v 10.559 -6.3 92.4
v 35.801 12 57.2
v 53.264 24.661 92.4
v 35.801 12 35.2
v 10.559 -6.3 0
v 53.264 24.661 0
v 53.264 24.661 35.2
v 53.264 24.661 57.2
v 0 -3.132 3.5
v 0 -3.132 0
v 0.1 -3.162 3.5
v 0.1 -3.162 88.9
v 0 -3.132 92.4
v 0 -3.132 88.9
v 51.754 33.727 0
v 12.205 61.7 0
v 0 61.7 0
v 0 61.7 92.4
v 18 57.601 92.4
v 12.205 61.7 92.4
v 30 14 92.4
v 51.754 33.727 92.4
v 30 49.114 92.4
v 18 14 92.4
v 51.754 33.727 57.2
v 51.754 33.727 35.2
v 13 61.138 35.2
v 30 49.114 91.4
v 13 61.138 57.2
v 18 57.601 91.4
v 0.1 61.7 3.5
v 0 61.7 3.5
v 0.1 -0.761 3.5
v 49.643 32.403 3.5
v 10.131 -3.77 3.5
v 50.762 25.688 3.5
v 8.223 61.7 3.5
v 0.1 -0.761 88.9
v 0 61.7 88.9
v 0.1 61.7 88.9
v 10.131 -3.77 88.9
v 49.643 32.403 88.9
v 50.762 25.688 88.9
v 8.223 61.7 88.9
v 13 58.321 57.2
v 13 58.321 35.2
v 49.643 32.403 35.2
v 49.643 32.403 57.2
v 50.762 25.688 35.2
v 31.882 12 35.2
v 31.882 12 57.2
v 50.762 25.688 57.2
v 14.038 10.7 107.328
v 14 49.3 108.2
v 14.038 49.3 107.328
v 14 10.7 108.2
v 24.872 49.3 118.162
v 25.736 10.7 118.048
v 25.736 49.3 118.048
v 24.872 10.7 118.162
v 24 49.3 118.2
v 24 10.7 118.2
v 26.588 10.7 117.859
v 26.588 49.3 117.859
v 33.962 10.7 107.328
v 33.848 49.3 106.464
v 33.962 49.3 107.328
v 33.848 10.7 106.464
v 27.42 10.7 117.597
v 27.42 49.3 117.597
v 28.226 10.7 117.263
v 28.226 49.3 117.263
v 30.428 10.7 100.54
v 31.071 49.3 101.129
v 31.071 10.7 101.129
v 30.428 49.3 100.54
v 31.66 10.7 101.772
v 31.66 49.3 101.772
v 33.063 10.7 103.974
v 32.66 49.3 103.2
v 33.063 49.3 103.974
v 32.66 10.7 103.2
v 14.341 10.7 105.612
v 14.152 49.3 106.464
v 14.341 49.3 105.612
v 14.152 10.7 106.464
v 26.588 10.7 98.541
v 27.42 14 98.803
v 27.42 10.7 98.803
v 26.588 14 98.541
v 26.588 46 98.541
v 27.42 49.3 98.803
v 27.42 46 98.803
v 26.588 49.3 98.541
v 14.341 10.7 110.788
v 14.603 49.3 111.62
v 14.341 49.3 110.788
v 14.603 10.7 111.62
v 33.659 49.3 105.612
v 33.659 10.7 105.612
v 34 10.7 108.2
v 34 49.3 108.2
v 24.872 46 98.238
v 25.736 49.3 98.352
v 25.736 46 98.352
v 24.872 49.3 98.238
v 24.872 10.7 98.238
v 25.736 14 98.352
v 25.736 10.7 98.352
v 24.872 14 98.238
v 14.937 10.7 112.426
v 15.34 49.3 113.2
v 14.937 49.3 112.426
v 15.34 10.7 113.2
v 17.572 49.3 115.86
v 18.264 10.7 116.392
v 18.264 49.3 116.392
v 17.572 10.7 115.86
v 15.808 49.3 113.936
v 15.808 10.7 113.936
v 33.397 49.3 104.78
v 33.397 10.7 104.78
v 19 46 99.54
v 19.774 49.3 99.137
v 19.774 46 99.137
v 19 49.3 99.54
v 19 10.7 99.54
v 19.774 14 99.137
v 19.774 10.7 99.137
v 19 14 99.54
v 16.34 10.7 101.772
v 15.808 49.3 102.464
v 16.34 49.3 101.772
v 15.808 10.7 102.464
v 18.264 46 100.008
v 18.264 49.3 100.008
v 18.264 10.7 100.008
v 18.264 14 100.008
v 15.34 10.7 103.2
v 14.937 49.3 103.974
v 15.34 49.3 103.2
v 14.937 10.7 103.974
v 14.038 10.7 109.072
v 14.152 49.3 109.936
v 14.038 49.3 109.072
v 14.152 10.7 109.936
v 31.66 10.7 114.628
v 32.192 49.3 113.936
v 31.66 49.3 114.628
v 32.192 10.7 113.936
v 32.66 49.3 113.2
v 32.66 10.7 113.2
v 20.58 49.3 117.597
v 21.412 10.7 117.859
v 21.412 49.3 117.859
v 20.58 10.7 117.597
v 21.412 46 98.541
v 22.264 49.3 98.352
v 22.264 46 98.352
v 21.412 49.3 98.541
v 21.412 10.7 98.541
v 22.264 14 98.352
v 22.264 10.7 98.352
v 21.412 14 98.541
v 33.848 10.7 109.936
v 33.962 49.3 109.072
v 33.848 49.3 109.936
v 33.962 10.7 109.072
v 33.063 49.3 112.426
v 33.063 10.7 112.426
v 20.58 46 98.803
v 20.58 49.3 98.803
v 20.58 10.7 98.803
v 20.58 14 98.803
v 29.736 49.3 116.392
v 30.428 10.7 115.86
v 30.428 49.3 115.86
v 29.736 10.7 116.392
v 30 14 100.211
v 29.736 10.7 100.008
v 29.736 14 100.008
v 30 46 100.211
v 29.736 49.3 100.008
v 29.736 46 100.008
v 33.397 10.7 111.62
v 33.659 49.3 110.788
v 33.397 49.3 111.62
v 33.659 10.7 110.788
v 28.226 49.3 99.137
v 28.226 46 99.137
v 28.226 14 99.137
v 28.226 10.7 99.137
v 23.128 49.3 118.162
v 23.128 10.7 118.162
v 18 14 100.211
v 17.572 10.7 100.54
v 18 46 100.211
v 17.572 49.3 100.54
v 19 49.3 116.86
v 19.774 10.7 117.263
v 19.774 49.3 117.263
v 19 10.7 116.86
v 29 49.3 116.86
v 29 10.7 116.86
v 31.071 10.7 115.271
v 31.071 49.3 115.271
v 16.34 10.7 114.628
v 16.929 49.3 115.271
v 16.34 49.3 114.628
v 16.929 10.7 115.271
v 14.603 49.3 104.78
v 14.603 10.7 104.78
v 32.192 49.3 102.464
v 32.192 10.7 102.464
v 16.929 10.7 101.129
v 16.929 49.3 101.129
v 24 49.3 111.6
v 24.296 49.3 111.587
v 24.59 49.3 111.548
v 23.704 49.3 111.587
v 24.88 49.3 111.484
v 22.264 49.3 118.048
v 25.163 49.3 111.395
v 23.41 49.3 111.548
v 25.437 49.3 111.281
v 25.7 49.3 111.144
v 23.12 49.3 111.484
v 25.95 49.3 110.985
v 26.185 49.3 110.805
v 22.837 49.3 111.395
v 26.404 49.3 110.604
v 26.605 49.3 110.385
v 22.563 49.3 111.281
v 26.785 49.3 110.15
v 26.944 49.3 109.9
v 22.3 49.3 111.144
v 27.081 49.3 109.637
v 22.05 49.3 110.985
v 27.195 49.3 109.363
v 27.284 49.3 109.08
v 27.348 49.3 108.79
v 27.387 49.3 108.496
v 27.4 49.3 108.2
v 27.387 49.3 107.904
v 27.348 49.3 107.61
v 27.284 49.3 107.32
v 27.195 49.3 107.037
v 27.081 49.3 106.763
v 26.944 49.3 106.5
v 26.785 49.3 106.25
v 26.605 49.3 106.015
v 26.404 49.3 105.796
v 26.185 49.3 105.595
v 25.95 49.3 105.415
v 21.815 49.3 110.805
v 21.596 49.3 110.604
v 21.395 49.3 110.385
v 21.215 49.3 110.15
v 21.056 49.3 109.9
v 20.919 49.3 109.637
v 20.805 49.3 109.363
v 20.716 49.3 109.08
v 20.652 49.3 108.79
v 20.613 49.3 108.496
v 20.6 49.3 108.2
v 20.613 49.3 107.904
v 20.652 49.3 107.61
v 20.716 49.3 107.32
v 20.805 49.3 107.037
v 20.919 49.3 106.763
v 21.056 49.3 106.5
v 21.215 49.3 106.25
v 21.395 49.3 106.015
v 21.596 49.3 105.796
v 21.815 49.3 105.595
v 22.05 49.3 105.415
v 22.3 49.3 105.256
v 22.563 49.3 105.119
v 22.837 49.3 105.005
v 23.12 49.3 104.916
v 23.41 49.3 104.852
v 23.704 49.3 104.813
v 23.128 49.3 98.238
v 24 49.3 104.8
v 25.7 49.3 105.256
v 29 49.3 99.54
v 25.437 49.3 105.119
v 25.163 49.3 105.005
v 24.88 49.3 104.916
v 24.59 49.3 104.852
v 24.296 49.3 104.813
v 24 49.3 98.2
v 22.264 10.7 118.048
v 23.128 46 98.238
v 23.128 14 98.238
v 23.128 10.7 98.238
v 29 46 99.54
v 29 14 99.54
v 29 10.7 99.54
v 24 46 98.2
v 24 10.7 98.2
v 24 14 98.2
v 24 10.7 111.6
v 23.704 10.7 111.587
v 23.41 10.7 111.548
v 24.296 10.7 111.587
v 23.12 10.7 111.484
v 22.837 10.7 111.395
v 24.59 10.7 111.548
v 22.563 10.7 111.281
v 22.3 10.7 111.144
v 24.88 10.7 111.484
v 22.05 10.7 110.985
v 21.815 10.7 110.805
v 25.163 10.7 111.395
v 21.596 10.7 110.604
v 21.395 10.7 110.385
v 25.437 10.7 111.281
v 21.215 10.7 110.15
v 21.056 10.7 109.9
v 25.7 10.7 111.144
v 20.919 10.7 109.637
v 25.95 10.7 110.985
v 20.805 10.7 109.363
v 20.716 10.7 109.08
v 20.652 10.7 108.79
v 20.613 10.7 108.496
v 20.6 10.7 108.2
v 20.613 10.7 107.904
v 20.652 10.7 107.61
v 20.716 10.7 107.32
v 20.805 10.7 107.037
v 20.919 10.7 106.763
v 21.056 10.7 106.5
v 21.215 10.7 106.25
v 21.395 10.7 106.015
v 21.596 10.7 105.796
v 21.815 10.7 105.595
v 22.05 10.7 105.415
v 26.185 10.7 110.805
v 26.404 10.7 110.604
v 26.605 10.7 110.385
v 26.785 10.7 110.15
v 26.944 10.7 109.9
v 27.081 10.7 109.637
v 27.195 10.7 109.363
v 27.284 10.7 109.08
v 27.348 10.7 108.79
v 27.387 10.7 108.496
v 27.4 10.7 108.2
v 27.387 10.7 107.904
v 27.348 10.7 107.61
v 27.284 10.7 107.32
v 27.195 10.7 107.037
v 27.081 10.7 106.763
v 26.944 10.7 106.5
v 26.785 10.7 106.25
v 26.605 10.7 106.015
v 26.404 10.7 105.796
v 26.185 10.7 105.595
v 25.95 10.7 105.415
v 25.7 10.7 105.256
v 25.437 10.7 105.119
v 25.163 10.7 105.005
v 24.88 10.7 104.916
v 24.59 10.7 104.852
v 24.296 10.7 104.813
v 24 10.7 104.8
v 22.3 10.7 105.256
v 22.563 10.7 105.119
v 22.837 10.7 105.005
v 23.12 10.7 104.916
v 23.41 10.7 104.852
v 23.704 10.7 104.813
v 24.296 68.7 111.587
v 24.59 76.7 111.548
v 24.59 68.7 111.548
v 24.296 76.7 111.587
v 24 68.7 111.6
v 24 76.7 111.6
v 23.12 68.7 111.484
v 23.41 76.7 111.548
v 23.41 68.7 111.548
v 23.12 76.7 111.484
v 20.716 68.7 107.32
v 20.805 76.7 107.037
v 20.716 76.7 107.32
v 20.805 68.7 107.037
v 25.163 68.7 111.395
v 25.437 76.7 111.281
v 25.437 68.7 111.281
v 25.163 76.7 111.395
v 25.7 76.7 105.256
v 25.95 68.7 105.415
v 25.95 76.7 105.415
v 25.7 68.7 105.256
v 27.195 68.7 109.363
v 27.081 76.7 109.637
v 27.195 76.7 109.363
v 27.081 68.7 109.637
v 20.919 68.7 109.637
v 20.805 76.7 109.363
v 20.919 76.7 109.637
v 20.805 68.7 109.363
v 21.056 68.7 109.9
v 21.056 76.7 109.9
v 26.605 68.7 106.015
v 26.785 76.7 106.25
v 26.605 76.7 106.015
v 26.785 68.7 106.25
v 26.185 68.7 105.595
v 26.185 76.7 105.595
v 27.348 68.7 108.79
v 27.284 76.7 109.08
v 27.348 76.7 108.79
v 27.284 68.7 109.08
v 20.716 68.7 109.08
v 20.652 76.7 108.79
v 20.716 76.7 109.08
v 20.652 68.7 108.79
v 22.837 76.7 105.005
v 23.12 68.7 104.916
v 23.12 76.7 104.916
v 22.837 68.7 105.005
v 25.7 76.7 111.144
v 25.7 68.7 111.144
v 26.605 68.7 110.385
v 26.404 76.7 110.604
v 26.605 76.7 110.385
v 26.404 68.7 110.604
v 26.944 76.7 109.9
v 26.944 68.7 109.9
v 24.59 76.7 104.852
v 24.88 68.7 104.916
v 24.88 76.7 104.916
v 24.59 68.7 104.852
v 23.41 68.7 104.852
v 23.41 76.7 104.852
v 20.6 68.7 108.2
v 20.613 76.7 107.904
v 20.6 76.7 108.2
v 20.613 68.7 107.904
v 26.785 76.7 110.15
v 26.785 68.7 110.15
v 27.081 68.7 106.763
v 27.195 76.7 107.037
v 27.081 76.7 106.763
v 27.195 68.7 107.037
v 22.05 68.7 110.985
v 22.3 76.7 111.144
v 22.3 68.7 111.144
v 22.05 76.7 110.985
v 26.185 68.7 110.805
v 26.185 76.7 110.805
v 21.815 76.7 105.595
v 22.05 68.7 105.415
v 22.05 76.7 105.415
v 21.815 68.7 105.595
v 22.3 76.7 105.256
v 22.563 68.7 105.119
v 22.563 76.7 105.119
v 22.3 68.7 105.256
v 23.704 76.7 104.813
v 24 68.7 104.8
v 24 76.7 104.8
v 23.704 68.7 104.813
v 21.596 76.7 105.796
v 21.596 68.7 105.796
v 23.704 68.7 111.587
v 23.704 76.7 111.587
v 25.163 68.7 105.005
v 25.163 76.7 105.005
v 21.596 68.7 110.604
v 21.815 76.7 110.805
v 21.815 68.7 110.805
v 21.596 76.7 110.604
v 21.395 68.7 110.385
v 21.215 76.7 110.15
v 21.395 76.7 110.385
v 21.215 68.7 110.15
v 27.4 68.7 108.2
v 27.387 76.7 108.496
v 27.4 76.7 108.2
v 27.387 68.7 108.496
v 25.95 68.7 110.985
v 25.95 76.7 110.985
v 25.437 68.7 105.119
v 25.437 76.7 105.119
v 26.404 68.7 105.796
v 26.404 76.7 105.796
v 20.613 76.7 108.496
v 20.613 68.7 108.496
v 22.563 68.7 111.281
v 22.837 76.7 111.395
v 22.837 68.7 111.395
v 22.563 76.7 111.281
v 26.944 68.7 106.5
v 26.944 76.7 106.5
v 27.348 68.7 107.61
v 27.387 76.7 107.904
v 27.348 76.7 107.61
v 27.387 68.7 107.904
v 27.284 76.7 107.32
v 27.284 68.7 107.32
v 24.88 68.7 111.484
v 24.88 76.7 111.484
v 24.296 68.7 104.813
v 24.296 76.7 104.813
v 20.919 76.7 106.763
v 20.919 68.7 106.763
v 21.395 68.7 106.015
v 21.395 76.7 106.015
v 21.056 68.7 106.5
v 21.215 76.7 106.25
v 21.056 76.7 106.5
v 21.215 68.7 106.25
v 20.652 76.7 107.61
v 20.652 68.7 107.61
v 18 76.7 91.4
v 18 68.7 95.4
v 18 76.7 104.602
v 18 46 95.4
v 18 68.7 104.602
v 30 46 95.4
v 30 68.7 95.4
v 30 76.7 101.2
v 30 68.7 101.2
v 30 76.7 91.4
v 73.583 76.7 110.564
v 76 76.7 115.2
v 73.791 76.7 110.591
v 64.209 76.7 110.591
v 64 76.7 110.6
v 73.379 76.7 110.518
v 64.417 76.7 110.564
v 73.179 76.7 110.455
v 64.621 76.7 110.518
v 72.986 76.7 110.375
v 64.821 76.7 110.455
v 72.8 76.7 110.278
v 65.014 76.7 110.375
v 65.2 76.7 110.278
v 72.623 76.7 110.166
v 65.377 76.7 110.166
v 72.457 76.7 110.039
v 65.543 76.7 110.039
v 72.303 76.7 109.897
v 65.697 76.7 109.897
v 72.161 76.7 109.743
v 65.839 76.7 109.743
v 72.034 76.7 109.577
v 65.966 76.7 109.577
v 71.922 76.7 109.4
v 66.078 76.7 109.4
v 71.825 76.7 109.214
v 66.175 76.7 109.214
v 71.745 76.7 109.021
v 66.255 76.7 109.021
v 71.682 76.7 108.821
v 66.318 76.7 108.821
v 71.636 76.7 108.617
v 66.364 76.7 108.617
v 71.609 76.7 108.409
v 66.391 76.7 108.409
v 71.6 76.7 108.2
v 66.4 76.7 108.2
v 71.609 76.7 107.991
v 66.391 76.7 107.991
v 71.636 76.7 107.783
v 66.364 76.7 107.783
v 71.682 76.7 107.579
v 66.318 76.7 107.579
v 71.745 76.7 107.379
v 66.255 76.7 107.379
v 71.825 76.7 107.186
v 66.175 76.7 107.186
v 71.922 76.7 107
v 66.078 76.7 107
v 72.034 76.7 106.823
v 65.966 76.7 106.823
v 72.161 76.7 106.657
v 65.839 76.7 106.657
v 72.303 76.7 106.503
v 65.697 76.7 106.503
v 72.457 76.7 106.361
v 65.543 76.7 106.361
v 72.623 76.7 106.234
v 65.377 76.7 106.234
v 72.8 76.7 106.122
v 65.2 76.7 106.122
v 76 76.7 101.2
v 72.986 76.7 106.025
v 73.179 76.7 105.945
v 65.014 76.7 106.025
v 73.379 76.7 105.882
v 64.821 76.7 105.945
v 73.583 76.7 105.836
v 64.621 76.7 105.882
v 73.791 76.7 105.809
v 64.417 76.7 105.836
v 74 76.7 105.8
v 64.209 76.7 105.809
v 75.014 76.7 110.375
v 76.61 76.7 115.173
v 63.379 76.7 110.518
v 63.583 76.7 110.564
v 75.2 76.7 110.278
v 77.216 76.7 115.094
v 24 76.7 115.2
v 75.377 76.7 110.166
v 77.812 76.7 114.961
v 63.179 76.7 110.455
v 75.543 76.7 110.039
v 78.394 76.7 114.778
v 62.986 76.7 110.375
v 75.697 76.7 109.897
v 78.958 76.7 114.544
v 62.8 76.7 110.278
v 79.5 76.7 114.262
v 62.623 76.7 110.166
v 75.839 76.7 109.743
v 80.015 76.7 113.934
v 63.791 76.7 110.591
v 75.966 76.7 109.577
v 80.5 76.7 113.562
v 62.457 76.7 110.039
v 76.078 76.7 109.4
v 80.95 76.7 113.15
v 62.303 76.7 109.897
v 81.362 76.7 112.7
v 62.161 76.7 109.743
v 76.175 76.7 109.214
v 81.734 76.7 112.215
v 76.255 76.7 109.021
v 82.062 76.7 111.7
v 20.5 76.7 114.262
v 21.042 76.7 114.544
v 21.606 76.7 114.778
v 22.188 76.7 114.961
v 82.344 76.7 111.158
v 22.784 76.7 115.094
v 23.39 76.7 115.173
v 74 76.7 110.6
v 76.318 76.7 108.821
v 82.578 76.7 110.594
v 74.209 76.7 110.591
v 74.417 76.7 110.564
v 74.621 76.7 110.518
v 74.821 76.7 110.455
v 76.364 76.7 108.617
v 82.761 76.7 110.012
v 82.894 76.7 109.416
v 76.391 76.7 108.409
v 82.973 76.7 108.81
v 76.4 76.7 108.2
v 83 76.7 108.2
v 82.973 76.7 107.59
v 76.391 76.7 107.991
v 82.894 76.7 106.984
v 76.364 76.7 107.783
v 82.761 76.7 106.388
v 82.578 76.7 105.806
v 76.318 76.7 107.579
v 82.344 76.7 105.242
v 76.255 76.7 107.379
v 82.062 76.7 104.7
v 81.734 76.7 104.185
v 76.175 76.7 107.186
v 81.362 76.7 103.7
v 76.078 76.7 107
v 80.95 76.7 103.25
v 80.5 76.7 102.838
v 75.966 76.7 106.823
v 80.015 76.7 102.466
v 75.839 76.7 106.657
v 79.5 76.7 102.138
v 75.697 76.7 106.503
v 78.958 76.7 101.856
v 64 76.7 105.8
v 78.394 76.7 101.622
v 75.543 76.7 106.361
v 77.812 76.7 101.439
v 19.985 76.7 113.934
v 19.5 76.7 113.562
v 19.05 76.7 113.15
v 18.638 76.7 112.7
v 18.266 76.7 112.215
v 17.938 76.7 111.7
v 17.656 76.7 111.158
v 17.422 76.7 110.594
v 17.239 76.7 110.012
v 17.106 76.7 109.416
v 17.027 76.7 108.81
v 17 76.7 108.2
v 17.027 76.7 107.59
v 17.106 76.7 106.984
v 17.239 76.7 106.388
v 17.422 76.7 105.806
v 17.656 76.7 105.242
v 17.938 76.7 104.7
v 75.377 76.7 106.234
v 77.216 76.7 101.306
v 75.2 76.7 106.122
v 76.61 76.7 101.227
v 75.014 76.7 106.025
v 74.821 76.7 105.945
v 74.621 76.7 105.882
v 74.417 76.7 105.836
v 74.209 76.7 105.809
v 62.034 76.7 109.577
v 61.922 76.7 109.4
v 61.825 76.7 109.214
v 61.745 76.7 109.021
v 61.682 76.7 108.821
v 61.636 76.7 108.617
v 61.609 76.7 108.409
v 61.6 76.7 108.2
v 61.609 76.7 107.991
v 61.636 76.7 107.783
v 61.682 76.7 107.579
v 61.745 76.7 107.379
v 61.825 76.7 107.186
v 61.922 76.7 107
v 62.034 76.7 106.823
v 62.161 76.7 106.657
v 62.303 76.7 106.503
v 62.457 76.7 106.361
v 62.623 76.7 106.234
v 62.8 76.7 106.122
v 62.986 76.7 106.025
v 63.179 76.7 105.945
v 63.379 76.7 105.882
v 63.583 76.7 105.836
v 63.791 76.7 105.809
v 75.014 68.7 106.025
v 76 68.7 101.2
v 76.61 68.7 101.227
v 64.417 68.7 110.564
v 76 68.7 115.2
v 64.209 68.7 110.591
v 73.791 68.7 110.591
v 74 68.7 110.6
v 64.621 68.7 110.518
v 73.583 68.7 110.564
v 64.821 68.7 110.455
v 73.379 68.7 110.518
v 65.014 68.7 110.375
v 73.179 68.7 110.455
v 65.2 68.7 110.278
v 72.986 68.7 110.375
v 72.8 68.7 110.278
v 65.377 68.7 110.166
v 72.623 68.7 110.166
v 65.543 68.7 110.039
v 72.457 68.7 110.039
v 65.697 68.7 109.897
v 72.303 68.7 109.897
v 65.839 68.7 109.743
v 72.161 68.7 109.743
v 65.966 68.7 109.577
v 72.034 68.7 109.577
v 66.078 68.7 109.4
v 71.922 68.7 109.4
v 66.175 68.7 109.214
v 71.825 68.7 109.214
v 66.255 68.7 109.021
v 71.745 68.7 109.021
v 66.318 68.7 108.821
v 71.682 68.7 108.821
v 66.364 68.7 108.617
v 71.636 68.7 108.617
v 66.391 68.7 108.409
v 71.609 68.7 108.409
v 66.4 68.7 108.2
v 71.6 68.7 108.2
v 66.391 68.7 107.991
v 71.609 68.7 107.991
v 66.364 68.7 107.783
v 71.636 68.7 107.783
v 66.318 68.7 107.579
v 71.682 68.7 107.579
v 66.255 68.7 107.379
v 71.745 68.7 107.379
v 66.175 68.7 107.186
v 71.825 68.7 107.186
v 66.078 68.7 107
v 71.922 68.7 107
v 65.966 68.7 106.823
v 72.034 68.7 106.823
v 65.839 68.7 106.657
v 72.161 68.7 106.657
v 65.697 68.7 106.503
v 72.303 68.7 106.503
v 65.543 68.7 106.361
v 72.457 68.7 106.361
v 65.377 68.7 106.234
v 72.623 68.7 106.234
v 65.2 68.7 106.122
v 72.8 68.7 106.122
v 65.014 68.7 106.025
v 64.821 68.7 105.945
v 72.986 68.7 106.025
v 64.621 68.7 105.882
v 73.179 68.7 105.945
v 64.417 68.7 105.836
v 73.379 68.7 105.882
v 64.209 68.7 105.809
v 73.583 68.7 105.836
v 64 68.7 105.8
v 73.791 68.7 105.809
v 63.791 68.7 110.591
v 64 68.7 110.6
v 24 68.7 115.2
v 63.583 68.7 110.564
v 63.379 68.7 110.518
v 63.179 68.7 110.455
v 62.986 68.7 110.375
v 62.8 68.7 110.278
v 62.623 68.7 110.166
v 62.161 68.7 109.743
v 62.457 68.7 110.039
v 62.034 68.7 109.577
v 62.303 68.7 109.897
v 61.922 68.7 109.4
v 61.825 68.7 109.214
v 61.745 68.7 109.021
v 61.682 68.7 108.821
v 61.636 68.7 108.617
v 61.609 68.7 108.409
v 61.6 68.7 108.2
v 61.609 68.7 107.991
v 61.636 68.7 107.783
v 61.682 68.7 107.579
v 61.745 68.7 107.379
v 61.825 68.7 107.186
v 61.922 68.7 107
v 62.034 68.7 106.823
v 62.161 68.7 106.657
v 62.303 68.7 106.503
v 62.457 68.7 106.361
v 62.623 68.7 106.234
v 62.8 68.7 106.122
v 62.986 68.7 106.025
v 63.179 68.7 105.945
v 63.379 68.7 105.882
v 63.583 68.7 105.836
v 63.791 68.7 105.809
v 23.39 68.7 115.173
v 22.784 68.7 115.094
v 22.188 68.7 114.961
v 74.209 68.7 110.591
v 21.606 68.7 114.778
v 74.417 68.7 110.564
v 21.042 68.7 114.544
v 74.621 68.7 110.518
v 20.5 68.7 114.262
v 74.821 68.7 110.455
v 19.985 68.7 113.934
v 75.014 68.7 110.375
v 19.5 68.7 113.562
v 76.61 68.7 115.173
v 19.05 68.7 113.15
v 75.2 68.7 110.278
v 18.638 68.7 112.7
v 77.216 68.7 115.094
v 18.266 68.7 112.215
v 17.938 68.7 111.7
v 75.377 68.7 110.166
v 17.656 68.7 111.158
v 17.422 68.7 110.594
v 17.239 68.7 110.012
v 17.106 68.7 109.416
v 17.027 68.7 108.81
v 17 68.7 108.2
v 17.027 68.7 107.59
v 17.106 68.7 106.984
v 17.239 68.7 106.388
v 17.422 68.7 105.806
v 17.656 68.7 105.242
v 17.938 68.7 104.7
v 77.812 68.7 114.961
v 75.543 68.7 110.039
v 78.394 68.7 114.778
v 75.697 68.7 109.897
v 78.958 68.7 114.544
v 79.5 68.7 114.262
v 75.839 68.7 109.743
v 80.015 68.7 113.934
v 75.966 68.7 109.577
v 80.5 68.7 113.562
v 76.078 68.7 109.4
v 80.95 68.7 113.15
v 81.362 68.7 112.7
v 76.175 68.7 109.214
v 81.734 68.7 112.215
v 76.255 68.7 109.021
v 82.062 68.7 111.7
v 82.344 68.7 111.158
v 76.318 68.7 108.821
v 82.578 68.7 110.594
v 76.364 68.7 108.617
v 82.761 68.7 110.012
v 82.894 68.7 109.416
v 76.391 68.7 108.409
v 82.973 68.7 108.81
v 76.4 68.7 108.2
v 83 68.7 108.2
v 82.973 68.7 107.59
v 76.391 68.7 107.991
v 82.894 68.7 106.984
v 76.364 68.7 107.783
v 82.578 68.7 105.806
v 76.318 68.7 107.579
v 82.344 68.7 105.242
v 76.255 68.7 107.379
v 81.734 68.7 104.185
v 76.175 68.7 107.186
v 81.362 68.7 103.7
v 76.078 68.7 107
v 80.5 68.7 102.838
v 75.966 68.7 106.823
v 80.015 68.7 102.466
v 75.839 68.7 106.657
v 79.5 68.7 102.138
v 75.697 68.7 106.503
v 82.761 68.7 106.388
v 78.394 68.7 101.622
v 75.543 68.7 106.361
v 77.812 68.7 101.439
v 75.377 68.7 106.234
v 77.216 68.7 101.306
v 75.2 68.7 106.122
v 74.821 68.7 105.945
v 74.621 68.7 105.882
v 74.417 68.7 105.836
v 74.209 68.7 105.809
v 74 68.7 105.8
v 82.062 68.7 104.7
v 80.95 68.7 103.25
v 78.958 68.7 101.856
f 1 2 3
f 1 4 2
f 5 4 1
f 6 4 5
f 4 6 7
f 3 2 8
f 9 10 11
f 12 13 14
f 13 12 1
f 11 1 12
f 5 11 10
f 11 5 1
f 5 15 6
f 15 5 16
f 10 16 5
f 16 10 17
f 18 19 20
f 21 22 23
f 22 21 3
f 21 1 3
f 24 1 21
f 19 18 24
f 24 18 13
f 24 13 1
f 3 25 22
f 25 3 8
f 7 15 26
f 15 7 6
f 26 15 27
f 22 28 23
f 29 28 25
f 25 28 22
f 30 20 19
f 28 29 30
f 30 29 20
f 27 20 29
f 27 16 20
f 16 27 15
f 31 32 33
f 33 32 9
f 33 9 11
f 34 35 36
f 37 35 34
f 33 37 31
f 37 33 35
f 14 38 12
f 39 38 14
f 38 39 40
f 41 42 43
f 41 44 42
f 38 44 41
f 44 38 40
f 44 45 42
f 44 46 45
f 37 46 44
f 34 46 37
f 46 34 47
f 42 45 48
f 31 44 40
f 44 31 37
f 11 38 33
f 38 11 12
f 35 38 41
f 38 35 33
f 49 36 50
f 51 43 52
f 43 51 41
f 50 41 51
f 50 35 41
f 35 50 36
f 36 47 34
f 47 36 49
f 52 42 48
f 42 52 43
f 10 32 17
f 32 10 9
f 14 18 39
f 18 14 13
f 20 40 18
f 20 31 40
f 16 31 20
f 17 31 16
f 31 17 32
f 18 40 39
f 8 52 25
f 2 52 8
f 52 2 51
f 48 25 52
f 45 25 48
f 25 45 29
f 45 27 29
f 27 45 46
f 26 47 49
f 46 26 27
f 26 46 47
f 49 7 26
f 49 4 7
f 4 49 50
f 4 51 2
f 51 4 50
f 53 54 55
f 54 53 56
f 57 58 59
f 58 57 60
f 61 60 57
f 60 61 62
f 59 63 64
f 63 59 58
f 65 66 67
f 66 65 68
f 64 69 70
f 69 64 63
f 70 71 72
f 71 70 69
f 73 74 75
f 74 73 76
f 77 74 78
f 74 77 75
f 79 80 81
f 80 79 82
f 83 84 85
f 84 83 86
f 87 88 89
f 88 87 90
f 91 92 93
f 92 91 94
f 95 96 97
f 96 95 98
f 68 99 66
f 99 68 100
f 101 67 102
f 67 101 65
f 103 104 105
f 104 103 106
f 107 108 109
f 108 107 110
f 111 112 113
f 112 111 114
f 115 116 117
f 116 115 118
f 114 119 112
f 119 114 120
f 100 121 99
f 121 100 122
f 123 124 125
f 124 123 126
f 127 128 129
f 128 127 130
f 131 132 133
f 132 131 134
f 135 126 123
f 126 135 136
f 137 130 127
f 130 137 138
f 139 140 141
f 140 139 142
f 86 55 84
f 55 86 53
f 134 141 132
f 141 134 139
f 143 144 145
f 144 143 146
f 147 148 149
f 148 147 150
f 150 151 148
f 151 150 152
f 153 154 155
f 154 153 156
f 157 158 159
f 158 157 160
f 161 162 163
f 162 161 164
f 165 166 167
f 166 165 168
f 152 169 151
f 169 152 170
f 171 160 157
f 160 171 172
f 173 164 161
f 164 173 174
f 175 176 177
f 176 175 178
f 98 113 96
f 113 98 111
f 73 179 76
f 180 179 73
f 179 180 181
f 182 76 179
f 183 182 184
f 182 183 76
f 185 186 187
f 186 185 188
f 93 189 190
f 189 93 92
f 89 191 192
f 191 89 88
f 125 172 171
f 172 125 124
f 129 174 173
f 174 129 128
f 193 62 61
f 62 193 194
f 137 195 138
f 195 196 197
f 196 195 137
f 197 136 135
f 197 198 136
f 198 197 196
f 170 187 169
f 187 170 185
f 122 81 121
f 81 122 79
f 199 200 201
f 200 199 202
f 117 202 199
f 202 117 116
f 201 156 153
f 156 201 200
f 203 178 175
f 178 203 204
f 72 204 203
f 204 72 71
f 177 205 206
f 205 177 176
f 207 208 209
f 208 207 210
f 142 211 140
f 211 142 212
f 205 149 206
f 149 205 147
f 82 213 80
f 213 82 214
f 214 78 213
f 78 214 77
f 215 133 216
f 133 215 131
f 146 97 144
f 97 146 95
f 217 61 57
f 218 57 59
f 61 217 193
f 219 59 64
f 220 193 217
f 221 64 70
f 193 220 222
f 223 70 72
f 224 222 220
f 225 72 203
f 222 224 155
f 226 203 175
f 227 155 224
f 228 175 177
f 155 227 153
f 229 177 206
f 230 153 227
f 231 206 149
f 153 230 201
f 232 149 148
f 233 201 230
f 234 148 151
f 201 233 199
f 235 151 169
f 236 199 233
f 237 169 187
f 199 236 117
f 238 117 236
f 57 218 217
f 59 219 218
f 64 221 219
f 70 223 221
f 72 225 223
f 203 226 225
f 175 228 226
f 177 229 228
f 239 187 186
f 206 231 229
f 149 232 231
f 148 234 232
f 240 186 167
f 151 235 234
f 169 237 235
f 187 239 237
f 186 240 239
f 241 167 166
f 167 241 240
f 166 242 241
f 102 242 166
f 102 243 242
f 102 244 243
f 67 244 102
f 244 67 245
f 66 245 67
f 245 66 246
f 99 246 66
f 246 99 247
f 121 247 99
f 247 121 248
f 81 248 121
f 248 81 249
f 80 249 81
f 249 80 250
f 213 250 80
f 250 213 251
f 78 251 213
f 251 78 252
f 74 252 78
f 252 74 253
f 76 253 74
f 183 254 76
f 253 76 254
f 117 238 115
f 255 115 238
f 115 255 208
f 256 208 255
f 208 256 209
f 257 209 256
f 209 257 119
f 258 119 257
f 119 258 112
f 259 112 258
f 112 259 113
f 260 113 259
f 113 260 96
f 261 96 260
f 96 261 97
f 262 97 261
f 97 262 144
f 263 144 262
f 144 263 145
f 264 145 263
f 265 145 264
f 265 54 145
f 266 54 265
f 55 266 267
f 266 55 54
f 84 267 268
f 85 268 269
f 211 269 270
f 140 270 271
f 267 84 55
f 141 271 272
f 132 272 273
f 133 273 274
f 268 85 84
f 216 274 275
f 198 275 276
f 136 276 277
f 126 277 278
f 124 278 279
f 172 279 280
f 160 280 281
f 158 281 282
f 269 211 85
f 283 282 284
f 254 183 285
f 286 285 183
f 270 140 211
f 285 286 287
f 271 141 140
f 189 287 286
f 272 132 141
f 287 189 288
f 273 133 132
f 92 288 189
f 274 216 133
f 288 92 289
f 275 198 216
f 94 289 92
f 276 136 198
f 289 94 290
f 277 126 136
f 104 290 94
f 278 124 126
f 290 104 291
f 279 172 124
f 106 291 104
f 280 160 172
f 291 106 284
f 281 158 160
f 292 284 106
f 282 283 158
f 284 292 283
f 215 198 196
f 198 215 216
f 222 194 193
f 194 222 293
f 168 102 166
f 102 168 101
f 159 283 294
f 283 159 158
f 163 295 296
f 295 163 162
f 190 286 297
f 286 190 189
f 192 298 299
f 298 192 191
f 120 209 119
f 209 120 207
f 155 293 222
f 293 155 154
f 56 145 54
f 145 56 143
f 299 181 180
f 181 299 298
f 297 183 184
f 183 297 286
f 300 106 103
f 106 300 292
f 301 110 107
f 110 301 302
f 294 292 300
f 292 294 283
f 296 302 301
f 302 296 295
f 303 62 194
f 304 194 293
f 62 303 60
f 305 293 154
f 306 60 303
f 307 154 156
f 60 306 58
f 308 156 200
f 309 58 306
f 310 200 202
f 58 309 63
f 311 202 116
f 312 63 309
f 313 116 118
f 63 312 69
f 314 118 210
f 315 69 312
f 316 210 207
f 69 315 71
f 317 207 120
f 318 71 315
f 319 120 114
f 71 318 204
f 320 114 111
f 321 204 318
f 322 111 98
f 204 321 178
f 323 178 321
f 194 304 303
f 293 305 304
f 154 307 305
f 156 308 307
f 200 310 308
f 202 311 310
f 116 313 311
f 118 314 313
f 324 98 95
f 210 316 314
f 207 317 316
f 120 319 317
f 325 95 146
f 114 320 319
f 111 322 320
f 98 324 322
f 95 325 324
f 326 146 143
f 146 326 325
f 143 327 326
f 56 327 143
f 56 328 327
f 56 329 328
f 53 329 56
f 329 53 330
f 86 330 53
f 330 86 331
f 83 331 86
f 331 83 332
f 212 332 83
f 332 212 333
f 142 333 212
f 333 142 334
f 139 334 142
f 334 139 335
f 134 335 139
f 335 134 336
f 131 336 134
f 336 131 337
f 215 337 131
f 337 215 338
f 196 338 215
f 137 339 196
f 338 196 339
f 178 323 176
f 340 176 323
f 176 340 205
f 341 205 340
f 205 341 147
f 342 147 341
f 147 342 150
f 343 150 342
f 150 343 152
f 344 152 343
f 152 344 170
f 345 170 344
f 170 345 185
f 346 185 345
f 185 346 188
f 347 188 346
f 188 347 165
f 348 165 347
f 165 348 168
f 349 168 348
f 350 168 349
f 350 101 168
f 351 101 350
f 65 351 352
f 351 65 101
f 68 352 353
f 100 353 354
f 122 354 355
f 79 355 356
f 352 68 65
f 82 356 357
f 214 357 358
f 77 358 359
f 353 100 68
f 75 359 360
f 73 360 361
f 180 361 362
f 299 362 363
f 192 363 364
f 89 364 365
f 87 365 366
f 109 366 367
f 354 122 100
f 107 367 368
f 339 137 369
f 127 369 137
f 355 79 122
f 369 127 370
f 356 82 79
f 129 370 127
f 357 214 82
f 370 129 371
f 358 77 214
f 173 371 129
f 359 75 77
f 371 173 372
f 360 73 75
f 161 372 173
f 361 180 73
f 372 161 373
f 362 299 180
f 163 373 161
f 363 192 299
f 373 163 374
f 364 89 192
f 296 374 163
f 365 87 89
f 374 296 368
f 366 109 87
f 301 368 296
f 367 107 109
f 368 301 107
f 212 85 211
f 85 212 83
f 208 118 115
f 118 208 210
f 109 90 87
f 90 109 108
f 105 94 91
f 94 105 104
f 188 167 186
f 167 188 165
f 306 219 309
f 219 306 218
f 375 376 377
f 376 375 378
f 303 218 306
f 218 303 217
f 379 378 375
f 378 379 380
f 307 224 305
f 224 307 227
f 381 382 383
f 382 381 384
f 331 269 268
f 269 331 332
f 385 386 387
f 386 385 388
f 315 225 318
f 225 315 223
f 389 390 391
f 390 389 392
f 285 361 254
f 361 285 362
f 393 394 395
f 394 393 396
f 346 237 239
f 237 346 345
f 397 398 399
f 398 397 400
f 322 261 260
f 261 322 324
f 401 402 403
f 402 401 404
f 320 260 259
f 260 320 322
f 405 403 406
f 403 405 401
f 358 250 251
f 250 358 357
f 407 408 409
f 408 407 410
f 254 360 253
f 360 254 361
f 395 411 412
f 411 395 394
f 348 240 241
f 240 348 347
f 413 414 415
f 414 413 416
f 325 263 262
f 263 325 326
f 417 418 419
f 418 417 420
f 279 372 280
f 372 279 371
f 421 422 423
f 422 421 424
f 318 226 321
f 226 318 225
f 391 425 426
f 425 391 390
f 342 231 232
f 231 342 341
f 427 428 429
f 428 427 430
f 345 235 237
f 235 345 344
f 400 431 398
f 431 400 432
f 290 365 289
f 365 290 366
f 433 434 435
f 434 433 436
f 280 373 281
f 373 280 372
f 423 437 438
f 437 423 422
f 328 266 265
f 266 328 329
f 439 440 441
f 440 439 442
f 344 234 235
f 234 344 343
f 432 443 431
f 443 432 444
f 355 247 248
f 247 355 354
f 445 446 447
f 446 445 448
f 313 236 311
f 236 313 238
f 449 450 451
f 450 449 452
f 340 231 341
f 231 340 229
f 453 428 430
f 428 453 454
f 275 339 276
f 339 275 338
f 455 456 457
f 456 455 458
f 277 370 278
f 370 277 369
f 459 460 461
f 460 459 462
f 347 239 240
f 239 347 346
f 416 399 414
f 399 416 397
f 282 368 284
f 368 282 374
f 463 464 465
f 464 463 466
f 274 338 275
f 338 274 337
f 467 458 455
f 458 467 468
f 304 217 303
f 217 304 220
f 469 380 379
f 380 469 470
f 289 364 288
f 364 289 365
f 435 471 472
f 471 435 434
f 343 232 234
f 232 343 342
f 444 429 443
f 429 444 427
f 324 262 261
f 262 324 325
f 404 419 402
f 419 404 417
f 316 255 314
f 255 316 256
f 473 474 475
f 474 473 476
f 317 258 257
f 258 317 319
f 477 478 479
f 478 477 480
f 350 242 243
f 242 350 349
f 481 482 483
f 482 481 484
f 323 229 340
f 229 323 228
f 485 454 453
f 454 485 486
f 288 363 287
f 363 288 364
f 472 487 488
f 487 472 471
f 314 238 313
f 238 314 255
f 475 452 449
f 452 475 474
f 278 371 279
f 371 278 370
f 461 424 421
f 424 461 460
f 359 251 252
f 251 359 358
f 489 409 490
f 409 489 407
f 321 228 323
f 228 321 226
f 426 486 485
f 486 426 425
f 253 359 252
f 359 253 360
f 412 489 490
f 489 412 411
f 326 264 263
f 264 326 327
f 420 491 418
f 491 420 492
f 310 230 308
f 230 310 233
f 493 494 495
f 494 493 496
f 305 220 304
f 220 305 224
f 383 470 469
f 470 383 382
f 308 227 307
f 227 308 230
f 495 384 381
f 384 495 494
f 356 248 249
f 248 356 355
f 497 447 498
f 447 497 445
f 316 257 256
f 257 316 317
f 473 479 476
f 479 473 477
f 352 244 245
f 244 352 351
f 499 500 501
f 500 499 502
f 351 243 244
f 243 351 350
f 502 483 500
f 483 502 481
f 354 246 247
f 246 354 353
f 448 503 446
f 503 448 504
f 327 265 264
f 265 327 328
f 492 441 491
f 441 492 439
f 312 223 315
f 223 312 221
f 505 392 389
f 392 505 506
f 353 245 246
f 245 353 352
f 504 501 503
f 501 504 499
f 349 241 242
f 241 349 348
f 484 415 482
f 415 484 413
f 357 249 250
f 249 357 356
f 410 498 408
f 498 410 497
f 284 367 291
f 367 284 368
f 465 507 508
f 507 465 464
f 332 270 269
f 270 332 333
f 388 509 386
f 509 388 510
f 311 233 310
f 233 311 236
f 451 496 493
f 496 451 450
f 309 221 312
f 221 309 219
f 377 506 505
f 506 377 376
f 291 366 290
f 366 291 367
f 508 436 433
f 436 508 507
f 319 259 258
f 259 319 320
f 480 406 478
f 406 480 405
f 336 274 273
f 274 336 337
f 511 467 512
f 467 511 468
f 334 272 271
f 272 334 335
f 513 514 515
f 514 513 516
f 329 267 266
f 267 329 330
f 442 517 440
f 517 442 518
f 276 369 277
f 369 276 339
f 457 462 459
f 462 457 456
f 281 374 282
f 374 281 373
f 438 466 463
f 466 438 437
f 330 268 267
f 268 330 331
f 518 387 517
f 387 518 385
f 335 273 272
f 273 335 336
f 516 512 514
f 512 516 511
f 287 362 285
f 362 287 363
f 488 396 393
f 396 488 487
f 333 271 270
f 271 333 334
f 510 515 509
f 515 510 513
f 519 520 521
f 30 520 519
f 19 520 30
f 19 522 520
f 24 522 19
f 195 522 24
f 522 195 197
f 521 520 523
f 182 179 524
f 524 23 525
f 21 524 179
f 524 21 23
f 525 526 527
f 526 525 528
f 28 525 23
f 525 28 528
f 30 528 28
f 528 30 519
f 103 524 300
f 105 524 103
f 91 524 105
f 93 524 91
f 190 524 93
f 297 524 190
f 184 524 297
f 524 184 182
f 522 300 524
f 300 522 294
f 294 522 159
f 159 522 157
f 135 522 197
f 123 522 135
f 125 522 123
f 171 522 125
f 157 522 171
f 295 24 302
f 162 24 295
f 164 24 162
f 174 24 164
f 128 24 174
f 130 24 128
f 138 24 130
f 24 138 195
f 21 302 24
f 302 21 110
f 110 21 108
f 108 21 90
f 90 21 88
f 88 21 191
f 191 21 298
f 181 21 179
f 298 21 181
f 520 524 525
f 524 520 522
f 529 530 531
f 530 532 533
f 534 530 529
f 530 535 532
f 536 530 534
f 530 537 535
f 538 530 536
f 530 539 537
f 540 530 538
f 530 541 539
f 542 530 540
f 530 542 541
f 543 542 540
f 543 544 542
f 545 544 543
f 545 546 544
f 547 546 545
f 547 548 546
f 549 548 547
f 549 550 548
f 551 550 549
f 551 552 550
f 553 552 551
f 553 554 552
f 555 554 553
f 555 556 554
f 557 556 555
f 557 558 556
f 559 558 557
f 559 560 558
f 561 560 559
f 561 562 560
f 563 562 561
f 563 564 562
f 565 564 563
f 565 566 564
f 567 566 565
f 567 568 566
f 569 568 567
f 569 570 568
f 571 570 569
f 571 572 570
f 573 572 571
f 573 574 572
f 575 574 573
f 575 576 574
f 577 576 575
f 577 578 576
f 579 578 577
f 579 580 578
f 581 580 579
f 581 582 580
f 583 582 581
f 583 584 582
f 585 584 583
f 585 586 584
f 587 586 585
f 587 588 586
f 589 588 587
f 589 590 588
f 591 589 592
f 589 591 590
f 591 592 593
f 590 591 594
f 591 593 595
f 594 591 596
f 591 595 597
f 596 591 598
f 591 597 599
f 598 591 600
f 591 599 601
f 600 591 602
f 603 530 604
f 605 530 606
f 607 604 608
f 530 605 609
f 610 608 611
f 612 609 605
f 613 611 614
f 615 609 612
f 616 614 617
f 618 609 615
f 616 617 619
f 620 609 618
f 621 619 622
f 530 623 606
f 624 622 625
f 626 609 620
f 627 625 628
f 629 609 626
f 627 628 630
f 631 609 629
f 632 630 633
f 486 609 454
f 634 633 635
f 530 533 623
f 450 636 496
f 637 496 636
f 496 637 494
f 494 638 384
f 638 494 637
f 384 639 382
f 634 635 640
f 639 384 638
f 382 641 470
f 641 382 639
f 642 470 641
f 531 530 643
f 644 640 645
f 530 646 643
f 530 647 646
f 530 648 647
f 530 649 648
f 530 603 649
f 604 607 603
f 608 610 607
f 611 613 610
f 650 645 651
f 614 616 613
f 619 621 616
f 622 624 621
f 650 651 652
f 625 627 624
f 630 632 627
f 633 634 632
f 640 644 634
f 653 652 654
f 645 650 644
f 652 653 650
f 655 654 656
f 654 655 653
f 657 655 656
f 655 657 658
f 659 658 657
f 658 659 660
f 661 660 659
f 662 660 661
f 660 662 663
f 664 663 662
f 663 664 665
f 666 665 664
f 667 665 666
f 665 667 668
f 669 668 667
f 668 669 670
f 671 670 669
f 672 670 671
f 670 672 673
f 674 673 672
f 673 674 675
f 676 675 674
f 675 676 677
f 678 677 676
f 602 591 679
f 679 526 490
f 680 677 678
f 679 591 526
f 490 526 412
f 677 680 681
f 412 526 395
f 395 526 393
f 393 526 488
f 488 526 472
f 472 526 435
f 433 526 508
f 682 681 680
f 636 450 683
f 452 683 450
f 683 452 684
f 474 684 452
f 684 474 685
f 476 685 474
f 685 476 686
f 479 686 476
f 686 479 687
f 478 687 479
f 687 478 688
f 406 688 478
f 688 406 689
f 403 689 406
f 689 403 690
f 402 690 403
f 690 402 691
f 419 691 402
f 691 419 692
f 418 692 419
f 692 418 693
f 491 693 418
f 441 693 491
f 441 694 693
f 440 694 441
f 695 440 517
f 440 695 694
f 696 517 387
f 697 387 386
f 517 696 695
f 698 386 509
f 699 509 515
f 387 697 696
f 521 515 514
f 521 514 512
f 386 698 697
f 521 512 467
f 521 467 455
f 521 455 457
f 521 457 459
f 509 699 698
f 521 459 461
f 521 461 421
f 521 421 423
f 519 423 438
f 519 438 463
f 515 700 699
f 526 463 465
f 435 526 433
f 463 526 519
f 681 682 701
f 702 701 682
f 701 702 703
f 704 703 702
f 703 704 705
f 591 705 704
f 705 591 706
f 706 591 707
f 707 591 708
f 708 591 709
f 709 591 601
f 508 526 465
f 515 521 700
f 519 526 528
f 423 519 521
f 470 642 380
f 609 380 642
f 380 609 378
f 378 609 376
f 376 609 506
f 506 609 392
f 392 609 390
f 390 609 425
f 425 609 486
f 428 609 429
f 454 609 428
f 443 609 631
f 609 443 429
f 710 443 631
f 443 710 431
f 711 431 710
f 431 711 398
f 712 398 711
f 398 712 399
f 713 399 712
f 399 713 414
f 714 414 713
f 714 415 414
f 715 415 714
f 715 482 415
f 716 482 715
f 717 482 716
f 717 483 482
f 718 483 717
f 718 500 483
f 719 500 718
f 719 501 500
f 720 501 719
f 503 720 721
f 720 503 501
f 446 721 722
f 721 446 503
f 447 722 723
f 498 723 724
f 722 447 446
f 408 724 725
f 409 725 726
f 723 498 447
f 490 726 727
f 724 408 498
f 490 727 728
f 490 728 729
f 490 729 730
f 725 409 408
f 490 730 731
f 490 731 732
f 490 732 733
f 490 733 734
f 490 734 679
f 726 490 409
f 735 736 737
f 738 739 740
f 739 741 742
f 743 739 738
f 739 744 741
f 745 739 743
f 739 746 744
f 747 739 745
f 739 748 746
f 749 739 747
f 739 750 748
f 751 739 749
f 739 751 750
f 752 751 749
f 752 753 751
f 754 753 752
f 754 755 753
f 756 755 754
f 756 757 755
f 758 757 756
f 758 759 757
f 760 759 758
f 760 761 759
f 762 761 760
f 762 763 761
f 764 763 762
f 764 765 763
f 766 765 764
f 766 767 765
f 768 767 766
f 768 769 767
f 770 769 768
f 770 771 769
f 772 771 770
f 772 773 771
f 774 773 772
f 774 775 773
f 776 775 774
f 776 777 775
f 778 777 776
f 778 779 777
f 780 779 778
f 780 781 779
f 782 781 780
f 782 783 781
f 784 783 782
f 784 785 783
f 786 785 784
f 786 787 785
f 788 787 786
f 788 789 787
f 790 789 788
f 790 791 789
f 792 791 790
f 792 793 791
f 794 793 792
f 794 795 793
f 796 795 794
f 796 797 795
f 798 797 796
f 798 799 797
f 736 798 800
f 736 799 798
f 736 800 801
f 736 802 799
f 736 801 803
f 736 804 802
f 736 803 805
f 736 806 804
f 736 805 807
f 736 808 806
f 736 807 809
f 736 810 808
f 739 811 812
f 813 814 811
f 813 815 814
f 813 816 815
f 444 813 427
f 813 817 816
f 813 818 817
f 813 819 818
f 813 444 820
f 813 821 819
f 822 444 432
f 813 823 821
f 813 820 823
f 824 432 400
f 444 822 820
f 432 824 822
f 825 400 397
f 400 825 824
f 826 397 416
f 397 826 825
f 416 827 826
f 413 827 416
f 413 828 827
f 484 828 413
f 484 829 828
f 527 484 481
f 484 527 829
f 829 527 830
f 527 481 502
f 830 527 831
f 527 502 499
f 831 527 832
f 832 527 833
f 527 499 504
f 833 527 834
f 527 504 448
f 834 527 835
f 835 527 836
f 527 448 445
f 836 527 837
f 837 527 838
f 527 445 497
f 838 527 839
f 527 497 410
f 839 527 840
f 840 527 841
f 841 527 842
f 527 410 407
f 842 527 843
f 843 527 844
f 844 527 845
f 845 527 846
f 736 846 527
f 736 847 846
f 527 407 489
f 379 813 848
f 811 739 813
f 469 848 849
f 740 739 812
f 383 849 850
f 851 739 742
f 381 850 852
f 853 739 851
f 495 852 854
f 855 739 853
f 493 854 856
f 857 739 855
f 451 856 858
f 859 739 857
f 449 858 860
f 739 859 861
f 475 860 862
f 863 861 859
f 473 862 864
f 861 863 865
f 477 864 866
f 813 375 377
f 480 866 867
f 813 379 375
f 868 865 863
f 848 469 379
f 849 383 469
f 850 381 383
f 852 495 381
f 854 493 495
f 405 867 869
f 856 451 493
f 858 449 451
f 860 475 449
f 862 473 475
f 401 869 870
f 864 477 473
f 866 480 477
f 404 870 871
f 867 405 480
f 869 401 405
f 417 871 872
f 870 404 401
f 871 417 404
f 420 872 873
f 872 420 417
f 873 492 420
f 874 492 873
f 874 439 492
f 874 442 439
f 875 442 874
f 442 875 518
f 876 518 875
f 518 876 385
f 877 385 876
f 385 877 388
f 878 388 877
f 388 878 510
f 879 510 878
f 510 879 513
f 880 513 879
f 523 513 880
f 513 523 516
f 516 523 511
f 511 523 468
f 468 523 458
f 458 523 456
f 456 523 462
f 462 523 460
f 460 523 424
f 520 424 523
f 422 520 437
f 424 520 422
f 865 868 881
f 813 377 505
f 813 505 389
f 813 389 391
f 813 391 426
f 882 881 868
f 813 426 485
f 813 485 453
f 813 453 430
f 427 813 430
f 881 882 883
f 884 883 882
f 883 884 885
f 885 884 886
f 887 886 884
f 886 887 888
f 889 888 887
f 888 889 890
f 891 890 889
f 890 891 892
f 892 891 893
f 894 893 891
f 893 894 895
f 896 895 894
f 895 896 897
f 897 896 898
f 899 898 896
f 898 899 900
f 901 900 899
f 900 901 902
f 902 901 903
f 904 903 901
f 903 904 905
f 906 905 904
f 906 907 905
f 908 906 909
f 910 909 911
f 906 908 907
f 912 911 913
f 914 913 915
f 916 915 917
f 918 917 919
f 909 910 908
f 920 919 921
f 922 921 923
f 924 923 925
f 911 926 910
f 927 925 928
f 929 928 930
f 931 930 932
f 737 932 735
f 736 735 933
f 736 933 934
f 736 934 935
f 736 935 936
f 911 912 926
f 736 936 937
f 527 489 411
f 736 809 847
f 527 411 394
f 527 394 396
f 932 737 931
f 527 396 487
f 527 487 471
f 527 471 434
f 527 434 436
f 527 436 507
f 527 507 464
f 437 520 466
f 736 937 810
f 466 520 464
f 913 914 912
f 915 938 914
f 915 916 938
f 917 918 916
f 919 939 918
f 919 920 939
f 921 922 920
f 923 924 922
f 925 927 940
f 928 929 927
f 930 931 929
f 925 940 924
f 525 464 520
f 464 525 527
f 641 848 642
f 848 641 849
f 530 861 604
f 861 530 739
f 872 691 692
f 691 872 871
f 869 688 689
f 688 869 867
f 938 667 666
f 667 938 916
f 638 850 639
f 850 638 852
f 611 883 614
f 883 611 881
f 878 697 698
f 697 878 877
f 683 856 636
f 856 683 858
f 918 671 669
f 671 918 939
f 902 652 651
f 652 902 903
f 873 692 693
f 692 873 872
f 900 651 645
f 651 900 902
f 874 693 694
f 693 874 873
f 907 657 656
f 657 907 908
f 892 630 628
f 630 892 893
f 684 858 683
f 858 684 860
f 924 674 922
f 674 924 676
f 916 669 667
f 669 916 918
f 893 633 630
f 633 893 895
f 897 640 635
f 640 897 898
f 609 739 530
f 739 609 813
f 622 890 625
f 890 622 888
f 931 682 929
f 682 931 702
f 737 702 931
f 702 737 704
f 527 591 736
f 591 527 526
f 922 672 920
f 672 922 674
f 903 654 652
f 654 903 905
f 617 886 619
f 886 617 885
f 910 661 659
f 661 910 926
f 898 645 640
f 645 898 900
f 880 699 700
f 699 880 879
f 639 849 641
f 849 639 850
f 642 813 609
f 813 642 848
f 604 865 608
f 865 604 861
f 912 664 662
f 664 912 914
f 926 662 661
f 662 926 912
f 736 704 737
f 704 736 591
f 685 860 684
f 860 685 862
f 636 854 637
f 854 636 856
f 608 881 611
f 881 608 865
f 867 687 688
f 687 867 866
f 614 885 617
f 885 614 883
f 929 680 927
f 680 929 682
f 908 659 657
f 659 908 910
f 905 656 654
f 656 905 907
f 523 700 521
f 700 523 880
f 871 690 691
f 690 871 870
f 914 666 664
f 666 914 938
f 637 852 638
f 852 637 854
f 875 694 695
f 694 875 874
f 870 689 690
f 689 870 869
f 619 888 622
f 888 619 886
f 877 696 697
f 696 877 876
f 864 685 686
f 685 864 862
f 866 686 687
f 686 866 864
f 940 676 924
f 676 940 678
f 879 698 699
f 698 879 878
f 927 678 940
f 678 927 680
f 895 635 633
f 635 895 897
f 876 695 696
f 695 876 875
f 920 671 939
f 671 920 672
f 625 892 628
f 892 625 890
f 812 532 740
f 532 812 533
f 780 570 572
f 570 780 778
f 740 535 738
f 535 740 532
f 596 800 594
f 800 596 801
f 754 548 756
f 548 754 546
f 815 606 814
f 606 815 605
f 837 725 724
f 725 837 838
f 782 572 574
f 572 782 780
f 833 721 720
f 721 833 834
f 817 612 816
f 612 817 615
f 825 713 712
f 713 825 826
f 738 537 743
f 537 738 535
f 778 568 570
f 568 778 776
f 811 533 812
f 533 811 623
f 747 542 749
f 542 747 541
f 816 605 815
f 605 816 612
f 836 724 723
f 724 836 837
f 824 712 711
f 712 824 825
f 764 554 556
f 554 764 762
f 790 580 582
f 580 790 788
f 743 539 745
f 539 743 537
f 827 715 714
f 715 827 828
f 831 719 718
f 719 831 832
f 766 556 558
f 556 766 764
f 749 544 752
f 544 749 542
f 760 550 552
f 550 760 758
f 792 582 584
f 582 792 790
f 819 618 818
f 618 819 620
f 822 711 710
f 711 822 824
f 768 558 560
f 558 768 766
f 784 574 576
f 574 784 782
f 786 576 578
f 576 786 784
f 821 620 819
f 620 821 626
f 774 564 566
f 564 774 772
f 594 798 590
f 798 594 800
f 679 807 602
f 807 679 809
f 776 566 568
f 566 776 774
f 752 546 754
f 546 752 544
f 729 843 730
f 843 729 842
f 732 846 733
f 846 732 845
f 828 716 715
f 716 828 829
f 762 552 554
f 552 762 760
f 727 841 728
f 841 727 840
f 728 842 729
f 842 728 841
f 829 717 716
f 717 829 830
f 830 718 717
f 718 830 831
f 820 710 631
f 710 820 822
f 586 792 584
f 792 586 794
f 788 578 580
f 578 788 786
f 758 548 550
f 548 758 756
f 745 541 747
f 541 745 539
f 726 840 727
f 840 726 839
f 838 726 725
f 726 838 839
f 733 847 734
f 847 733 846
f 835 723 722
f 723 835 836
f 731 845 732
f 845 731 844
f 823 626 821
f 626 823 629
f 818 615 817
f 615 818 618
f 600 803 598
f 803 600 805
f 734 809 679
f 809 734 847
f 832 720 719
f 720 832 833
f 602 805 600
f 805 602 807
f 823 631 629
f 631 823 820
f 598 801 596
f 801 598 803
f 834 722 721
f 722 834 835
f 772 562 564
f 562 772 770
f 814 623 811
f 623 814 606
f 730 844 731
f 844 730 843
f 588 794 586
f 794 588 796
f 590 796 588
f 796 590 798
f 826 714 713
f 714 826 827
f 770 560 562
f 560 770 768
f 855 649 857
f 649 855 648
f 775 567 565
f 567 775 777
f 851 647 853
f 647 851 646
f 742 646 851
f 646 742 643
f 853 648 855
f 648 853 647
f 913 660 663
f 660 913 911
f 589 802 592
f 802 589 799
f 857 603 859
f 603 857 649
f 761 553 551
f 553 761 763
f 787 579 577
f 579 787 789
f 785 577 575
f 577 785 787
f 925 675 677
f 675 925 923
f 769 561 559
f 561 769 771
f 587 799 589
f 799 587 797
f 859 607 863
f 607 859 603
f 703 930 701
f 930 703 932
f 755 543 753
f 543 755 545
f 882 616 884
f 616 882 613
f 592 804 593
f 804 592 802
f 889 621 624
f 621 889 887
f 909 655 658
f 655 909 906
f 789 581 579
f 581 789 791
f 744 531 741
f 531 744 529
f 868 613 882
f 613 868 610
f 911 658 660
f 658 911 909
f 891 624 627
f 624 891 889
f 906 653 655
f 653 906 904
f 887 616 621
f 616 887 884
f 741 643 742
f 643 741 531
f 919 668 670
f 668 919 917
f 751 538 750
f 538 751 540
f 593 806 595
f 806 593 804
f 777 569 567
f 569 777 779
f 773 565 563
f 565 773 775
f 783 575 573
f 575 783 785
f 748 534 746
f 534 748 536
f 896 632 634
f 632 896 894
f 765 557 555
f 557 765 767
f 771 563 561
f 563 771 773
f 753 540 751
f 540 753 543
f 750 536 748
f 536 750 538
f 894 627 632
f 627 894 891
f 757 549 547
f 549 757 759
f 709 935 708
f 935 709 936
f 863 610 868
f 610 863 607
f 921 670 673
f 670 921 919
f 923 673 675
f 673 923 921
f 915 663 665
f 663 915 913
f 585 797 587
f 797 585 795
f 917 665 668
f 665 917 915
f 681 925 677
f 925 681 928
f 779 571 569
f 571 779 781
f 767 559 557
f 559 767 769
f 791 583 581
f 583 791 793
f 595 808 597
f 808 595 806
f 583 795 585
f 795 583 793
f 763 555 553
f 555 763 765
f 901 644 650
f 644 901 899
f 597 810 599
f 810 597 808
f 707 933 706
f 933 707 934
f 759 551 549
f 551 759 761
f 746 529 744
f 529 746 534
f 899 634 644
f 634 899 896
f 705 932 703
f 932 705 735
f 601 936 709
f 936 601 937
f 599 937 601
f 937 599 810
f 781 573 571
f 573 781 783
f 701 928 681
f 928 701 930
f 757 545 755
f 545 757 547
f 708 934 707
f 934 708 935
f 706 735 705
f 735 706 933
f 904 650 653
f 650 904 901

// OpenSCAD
// V3. Millimetres. Assembly: X right, Y up, Z toward viewer.
// Print outputs selected with part. Assembly is inspection only.
part="holder"; // holder, wing, pivot_pin, index_pin, gauge, assembly
angle=0; // nominal -30..30 in 5-degree steps
$fn=72;
monitor=10; tape=1;
width=84; clearance=0.7; cheek=3.5; shell=3;
inner=width+2*clearance; left=-inner/2-cheek; right=inner/2+cheek;
ax=62; az=-(monitor+tape+13); // -24 nominal
profile=[[0,0],[61,0],[61,-8],[32,-49],[26,-50],[-3,-10]];
module prism_x(x,length){translate([x,0,0]) multmatrix([[0,0,1,0],[1,0,0,0],[0,1,0,0],[0,0,0,1]]) linear_extrude(length) children();}
module ycyl(x,y,z,h,r){translate([x,y,z]) rotate([-90,0,0]) cylinder(h=h,r=r);}
module pivot_rotate(a){translate([ax,0,az]) rotate([0,a,0]) translate([-ax,0,-az]) children();}
module cradle(){difference(){
 prism_x(left,inner+2*cheek) offset(delta=shell) polygon(profile);
 prism_x(-inner/2,inner) union(){offset(delta=clearance) polygon(profile);translate([-3-clearance,-0.1]) square([66,15]);}
 translate([-100,-20,0]) cube([200,120,30]);
 translate([-100,61+clearance,-80]) cube([200,30,110]);
 translate([-11,12,-70]) cube([22,65,57]);
}}
module hub(y,h){difference(){ycyl(ax,y,az,h,10);ycyl(ax,y-1,az,h+2,3.4);}}
module sector(){
 // Rear sector with alternating radii: no fine teeth or flexible tabs.
 difference(){
  union(){
   translate([ax,59.7,az]) rotate([-90,0,0]) linear_extrude(8.3)
    polygon(concat([for(a=[-35:1:35]) [56*sin(a),56*cos(a)]],[for(a=[35:-1:-35]) [23*sin(a),23*cos(a)]]));
   translate([ax-7,59.7,az-30]) cube([14,8.3,32]);
  }
  for(a=[-30:10:30]) ycyl(ax+50*sin(a),59,az-50*cos(a),10,2.4);
  for(a=[-25:10:25]) ycyl(ax+40*sin(a),59,az-40*cos(a),10,2.4);
  ycyl(ax,59,az,11,3.4);
  for(a=[-30:5:30]) let(r=(a%10==0 ? 54.1 : 34.5))
   translate([ax+r*sin(a),68.1,az-r*cos(a)]) rotate([90,0,0])
    linear_extrude(0.8) text(str(-a),size=2.2,halign="center",valign="center");
 }
}
module wing(){difference(){union(){
 // Adhesive face remains absolutely flat at Z=-11 (default).
 translate([ax+11,0,-monitor-tape-8]) cube([76,60,8]);
 // Rear reinforcing rails only.
 for(y=[5,49]) translate([ax+11,y,-monitor-tape-14]) cube([76,6,6.3]);
 for(y=[0,50]){
  hub(y,10);
  translate([ax, y, az-6]) cube([18,10,10]);
 }
 sector();
} ycyl(ax,-1,az,80,3.4);
}}
module holder(){difference(){union(){
 cradle();
 hub(10.7,38.6);
 translate([right-1,14,az-6]) cube([ax-right+2,32,12]);
 // Spine stays left of stationary upper hinge barrel.
 translate([right-1,26,az-6]) cube([4,47,12]);
 translate([right-1,68.7,az-6]) cube([ax-right+2,8,12]);
 hull(){ycyl(ax,68.7,az,8,7);ycyl(ax,68.7,az-52,8,7);}
 }
 ycyl(ax,9,az,70,3.4);
 for(r=[40,50]) ycyl(ax,68,az-r,10,2.4);
}}
module pin(d,L,head){
 // Print upright on head. Chamfered insertion end at top.
 cylinder(h=4,r=head/2);
 translate([0,0,3.8]) cylinder(h=L-0.8,r=d/2);
 translate([0,0,L+3]) cylinder(h=1,r1=d/2,r2=d/2-0.7);
}
module gauge(){intersection(){cradle();translate([left-0.1,-10,-70]) cube([10.6,85,90]);}}
if(part=="holder") translate([0,0,-left]) rotate([0,-90,0]) holder();
if(part=="wing") translate([0,0,-ax+56*sin(35)]) rotate([0,-90,0]) wing();
if(part=="pivot_pin") pin(6,78,14);
if(part=="index_pin") pin(4,18,10);
if(part=="gauge") translate([0,0,-left]) rotate([0,-90,0]) gauge();
if(part=="assembly"){
 color("SteelBlue") wing();
 color("DarkSlateGray") pivot_rotate(angle) holder();
}

if(part=="coupon") difference(){cube([32,16,16]);translate([9,-1,8]) rotate([-90,0,0]) cylinder(h=18,r=3.4);translate([24,-1,8]) rotate([-90,0,0]) cylinder(h=18,r=2.4);}
